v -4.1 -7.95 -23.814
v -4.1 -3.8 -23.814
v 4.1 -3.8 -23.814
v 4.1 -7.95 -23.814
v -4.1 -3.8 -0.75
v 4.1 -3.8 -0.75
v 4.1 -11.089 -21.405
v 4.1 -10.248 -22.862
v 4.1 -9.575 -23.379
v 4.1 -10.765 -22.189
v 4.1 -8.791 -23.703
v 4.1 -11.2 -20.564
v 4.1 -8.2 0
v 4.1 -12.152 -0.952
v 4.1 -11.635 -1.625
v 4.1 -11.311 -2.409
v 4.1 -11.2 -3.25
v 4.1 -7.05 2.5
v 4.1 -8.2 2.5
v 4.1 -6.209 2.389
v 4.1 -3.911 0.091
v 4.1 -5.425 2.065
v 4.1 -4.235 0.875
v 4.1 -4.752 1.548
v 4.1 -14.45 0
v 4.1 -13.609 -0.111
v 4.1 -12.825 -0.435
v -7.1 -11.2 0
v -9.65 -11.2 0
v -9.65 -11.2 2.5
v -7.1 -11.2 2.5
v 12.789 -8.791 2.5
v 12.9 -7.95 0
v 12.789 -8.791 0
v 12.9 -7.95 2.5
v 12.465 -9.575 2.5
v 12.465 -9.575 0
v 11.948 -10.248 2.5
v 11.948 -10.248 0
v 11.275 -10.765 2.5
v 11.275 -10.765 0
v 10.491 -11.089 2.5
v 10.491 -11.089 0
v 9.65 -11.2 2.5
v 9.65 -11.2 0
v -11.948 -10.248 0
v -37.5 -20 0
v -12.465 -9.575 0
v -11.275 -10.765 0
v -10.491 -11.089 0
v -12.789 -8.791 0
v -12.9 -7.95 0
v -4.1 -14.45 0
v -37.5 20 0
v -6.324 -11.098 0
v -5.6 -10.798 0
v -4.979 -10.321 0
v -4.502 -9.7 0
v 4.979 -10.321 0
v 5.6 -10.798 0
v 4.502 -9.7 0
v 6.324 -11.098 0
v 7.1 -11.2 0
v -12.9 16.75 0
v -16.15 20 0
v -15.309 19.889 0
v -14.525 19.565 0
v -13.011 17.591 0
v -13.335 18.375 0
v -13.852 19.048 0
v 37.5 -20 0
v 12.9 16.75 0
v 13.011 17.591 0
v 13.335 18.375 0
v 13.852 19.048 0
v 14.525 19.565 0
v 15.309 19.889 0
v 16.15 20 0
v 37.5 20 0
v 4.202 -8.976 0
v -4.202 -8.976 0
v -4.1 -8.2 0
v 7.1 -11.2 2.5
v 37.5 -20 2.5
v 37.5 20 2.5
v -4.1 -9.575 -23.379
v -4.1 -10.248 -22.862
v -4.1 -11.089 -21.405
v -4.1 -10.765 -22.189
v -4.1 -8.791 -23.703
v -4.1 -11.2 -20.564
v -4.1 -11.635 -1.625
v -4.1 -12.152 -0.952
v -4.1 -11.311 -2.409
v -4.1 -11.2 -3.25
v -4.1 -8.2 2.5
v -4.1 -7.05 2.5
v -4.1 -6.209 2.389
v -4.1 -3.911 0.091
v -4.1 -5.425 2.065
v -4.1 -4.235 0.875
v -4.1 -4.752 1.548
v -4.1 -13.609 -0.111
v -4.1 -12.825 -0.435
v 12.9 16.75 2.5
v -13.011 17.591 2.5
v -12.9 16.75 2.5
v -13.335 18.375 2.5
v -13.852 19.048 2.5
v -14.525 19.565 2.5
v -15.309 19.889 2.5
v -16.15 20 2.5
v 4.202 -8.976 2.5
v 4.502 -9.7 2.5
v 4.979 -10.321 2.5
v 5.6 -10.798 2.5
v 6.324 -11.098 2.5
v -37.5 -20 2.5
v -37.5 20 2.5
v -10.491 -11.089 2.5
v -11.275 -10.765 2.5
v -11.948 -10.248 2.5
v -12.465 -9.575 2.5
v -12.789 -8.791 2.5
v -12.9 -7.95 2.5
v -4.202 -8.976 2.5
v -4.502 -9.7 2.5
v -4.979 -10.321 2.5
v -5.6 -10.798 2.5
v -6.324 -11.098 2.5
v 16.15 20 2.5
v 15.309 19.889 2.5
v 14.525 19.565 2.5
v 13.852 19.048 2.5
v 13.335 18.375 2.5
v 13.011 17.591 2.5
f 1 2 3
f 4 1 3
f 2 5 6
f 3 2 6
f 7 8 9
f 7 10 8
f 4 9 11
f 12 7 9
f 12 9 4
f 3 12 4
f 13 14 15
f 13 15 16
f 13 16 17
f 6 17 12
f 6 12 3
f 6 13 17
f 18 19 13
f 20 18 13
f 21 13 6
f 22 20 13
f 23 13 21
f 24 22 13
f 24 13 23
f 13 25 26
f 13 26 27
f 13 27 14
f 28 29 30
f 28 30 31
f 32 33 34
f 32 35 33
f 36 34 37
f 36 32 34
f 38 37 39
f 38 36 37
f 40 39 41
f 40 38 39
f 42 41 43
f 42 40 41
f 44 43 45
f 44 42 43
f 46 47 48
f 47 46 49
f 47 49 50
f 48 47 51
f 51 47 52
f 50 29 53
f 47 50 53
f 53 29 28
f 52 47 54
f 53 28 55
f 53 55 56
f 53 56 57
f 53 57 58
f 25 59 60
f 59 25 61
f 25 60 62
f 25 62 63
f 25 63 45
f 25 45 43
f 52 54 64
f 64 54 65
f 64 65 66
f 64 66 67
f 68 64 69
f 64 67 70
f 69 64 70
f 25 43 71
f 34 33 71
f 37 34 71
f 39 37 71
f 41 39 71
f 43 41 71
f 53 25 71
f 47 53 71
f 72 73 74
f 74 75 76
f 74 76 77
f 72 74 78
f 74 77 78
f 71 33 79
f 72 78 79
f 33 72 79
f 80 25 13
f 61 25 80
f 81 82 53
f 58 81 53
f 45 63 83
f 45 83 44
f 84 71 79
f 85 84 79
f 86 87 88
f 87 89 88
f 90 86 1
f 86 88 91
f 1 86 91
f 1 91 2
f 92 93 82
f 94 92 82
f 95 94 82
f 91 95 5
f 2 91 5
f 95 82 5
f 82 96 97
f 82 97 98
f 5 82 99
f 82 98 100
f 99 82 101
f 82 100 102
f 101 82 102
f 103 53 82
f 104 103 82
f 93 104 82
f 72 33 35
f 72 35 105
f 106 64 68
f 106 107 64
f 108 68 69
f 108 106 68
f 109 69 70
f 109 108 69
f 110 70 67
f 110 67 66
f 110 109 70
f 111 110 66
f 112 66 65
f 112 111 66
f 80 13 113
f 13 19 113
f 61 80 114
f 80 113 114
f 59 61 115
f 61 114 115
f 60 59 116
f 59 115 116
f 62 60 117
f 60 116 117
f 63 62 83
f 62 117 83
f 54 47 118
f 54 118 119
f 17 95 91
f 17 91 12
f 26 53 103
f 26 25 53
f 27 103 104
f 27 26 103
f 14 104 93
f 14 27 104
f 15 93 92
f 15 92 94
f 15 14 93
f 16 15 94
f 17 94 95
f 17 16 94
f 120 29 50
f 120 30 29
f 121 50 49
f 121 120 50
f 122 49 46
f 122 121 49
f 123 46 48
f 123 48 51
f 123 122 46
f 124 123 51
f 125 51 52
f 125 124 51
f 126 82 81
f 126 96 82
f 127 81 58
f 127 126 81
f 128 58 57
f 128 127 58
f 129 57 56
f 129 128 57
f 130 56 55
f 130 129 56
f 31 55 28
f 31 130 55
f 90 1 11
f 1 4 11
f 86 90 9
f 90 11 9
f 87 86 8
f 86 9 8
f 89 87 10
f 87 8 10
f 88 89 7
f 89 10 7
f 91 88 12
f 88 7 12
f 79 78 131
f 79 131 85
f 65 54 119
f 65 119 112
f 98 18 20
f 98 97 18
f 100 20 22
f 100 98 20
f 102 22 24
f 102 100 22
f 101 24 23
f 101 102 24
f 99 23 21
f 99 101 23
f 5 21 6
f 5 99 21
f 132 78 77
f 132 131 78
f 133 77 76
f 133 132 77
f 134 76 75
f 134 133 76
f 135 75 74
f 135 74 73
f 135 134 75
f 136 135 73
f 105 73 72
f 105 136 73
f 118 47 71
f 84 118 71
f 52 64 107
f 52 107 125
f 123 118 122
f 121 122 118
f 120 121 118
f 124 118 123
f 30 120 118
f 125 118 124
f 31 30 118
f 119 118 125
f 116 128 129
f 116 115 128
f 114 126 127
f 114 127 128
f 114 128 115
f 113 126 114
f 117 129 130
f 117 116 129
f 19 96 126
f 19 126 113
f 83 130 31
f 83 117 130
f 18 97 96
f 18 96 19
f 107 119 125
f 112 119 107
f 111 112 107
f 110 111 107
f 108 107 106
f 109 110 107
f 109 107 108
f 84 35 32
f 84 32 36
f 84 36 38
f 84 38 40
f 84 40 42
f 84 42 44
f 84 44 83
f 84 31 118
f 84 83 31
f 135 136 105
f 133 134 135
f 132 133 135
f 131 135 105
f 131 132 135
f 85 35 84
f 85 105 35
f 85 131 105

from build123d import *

# Parameters (mm, degrees)
SKETCH1_W           = 75
SKETCH1_H           = 40
BOSS_EXTRUDE1_DEPTH = 2.5
CUT_EXTRUDE1_DEPTH  = 10
SKETCH2_3_W         = 8.2
SKETCH2_3_H         = 7.4
BOSS_EXTRUDE2_DEPTH = 23.814
FILLET1_R           = 3.25
FILLET2_R           = 3


with BuildPart() as part:
    # Sketch1 → Boss-Extrude1 (new body)
    with BuildSketch(Plane.XY):
        Rectangle(SKETCH1_W, SKETCH1_H)
    extrude(amount=BOSS_EXTRUDE1_DEPTH)

    # Sketch2 → Cut-Extrude1 (cut)
    with BuildSketch(Plane.XY):
        Polygon((12.9, -11.2), (12.9, 20), (-12.9, 20), (-12.9, -11.2), (-4.1, -11.2), (-4.1, -3.8), (4.1, -3.8), (4.1, -11.2), align=None)
    extrude(amount=CUT_EXTRUDE1_DEPTH, mode=Mode.SUBTRACT)

    # Sketch2<3> → Boss-Extrude2 (add)
    with BuildSketch(Plane.XY):
        with Locations((0, -7.5)):
            Rectangle(SKETCH2_3_W, SKETCH2_3_H)
    extrude(amount=-BOSS_EXTRUDE2_DEPTH)

    # Fillet1
    fillet1_edges = [part.edges().sort_by_distance(p)[0] for p in [
        (-12.9, 20, 1.25),
        (-12.9, -11.2, 1.25),
        (0, -3.8, 2.5),
        (0, -11.2, 0),
        (12.9, -11.2, 1.25),
        (12.9, 20, 1.25),
        (0, -11.2, -23.814),
    ]]
    fillet(fillet1_edges, radius=FILLET1_R)

    # Fillet2
    fillet2_edges = [part.edges().sort_by_distance(p)[0] for p in [
        (-4.1, -11.2, 1.25),
        (4.1, -11.2, 1.25),
    ]]
    fillet(fillet2_edges, radius=FILLET2_R)


solid = part.part
